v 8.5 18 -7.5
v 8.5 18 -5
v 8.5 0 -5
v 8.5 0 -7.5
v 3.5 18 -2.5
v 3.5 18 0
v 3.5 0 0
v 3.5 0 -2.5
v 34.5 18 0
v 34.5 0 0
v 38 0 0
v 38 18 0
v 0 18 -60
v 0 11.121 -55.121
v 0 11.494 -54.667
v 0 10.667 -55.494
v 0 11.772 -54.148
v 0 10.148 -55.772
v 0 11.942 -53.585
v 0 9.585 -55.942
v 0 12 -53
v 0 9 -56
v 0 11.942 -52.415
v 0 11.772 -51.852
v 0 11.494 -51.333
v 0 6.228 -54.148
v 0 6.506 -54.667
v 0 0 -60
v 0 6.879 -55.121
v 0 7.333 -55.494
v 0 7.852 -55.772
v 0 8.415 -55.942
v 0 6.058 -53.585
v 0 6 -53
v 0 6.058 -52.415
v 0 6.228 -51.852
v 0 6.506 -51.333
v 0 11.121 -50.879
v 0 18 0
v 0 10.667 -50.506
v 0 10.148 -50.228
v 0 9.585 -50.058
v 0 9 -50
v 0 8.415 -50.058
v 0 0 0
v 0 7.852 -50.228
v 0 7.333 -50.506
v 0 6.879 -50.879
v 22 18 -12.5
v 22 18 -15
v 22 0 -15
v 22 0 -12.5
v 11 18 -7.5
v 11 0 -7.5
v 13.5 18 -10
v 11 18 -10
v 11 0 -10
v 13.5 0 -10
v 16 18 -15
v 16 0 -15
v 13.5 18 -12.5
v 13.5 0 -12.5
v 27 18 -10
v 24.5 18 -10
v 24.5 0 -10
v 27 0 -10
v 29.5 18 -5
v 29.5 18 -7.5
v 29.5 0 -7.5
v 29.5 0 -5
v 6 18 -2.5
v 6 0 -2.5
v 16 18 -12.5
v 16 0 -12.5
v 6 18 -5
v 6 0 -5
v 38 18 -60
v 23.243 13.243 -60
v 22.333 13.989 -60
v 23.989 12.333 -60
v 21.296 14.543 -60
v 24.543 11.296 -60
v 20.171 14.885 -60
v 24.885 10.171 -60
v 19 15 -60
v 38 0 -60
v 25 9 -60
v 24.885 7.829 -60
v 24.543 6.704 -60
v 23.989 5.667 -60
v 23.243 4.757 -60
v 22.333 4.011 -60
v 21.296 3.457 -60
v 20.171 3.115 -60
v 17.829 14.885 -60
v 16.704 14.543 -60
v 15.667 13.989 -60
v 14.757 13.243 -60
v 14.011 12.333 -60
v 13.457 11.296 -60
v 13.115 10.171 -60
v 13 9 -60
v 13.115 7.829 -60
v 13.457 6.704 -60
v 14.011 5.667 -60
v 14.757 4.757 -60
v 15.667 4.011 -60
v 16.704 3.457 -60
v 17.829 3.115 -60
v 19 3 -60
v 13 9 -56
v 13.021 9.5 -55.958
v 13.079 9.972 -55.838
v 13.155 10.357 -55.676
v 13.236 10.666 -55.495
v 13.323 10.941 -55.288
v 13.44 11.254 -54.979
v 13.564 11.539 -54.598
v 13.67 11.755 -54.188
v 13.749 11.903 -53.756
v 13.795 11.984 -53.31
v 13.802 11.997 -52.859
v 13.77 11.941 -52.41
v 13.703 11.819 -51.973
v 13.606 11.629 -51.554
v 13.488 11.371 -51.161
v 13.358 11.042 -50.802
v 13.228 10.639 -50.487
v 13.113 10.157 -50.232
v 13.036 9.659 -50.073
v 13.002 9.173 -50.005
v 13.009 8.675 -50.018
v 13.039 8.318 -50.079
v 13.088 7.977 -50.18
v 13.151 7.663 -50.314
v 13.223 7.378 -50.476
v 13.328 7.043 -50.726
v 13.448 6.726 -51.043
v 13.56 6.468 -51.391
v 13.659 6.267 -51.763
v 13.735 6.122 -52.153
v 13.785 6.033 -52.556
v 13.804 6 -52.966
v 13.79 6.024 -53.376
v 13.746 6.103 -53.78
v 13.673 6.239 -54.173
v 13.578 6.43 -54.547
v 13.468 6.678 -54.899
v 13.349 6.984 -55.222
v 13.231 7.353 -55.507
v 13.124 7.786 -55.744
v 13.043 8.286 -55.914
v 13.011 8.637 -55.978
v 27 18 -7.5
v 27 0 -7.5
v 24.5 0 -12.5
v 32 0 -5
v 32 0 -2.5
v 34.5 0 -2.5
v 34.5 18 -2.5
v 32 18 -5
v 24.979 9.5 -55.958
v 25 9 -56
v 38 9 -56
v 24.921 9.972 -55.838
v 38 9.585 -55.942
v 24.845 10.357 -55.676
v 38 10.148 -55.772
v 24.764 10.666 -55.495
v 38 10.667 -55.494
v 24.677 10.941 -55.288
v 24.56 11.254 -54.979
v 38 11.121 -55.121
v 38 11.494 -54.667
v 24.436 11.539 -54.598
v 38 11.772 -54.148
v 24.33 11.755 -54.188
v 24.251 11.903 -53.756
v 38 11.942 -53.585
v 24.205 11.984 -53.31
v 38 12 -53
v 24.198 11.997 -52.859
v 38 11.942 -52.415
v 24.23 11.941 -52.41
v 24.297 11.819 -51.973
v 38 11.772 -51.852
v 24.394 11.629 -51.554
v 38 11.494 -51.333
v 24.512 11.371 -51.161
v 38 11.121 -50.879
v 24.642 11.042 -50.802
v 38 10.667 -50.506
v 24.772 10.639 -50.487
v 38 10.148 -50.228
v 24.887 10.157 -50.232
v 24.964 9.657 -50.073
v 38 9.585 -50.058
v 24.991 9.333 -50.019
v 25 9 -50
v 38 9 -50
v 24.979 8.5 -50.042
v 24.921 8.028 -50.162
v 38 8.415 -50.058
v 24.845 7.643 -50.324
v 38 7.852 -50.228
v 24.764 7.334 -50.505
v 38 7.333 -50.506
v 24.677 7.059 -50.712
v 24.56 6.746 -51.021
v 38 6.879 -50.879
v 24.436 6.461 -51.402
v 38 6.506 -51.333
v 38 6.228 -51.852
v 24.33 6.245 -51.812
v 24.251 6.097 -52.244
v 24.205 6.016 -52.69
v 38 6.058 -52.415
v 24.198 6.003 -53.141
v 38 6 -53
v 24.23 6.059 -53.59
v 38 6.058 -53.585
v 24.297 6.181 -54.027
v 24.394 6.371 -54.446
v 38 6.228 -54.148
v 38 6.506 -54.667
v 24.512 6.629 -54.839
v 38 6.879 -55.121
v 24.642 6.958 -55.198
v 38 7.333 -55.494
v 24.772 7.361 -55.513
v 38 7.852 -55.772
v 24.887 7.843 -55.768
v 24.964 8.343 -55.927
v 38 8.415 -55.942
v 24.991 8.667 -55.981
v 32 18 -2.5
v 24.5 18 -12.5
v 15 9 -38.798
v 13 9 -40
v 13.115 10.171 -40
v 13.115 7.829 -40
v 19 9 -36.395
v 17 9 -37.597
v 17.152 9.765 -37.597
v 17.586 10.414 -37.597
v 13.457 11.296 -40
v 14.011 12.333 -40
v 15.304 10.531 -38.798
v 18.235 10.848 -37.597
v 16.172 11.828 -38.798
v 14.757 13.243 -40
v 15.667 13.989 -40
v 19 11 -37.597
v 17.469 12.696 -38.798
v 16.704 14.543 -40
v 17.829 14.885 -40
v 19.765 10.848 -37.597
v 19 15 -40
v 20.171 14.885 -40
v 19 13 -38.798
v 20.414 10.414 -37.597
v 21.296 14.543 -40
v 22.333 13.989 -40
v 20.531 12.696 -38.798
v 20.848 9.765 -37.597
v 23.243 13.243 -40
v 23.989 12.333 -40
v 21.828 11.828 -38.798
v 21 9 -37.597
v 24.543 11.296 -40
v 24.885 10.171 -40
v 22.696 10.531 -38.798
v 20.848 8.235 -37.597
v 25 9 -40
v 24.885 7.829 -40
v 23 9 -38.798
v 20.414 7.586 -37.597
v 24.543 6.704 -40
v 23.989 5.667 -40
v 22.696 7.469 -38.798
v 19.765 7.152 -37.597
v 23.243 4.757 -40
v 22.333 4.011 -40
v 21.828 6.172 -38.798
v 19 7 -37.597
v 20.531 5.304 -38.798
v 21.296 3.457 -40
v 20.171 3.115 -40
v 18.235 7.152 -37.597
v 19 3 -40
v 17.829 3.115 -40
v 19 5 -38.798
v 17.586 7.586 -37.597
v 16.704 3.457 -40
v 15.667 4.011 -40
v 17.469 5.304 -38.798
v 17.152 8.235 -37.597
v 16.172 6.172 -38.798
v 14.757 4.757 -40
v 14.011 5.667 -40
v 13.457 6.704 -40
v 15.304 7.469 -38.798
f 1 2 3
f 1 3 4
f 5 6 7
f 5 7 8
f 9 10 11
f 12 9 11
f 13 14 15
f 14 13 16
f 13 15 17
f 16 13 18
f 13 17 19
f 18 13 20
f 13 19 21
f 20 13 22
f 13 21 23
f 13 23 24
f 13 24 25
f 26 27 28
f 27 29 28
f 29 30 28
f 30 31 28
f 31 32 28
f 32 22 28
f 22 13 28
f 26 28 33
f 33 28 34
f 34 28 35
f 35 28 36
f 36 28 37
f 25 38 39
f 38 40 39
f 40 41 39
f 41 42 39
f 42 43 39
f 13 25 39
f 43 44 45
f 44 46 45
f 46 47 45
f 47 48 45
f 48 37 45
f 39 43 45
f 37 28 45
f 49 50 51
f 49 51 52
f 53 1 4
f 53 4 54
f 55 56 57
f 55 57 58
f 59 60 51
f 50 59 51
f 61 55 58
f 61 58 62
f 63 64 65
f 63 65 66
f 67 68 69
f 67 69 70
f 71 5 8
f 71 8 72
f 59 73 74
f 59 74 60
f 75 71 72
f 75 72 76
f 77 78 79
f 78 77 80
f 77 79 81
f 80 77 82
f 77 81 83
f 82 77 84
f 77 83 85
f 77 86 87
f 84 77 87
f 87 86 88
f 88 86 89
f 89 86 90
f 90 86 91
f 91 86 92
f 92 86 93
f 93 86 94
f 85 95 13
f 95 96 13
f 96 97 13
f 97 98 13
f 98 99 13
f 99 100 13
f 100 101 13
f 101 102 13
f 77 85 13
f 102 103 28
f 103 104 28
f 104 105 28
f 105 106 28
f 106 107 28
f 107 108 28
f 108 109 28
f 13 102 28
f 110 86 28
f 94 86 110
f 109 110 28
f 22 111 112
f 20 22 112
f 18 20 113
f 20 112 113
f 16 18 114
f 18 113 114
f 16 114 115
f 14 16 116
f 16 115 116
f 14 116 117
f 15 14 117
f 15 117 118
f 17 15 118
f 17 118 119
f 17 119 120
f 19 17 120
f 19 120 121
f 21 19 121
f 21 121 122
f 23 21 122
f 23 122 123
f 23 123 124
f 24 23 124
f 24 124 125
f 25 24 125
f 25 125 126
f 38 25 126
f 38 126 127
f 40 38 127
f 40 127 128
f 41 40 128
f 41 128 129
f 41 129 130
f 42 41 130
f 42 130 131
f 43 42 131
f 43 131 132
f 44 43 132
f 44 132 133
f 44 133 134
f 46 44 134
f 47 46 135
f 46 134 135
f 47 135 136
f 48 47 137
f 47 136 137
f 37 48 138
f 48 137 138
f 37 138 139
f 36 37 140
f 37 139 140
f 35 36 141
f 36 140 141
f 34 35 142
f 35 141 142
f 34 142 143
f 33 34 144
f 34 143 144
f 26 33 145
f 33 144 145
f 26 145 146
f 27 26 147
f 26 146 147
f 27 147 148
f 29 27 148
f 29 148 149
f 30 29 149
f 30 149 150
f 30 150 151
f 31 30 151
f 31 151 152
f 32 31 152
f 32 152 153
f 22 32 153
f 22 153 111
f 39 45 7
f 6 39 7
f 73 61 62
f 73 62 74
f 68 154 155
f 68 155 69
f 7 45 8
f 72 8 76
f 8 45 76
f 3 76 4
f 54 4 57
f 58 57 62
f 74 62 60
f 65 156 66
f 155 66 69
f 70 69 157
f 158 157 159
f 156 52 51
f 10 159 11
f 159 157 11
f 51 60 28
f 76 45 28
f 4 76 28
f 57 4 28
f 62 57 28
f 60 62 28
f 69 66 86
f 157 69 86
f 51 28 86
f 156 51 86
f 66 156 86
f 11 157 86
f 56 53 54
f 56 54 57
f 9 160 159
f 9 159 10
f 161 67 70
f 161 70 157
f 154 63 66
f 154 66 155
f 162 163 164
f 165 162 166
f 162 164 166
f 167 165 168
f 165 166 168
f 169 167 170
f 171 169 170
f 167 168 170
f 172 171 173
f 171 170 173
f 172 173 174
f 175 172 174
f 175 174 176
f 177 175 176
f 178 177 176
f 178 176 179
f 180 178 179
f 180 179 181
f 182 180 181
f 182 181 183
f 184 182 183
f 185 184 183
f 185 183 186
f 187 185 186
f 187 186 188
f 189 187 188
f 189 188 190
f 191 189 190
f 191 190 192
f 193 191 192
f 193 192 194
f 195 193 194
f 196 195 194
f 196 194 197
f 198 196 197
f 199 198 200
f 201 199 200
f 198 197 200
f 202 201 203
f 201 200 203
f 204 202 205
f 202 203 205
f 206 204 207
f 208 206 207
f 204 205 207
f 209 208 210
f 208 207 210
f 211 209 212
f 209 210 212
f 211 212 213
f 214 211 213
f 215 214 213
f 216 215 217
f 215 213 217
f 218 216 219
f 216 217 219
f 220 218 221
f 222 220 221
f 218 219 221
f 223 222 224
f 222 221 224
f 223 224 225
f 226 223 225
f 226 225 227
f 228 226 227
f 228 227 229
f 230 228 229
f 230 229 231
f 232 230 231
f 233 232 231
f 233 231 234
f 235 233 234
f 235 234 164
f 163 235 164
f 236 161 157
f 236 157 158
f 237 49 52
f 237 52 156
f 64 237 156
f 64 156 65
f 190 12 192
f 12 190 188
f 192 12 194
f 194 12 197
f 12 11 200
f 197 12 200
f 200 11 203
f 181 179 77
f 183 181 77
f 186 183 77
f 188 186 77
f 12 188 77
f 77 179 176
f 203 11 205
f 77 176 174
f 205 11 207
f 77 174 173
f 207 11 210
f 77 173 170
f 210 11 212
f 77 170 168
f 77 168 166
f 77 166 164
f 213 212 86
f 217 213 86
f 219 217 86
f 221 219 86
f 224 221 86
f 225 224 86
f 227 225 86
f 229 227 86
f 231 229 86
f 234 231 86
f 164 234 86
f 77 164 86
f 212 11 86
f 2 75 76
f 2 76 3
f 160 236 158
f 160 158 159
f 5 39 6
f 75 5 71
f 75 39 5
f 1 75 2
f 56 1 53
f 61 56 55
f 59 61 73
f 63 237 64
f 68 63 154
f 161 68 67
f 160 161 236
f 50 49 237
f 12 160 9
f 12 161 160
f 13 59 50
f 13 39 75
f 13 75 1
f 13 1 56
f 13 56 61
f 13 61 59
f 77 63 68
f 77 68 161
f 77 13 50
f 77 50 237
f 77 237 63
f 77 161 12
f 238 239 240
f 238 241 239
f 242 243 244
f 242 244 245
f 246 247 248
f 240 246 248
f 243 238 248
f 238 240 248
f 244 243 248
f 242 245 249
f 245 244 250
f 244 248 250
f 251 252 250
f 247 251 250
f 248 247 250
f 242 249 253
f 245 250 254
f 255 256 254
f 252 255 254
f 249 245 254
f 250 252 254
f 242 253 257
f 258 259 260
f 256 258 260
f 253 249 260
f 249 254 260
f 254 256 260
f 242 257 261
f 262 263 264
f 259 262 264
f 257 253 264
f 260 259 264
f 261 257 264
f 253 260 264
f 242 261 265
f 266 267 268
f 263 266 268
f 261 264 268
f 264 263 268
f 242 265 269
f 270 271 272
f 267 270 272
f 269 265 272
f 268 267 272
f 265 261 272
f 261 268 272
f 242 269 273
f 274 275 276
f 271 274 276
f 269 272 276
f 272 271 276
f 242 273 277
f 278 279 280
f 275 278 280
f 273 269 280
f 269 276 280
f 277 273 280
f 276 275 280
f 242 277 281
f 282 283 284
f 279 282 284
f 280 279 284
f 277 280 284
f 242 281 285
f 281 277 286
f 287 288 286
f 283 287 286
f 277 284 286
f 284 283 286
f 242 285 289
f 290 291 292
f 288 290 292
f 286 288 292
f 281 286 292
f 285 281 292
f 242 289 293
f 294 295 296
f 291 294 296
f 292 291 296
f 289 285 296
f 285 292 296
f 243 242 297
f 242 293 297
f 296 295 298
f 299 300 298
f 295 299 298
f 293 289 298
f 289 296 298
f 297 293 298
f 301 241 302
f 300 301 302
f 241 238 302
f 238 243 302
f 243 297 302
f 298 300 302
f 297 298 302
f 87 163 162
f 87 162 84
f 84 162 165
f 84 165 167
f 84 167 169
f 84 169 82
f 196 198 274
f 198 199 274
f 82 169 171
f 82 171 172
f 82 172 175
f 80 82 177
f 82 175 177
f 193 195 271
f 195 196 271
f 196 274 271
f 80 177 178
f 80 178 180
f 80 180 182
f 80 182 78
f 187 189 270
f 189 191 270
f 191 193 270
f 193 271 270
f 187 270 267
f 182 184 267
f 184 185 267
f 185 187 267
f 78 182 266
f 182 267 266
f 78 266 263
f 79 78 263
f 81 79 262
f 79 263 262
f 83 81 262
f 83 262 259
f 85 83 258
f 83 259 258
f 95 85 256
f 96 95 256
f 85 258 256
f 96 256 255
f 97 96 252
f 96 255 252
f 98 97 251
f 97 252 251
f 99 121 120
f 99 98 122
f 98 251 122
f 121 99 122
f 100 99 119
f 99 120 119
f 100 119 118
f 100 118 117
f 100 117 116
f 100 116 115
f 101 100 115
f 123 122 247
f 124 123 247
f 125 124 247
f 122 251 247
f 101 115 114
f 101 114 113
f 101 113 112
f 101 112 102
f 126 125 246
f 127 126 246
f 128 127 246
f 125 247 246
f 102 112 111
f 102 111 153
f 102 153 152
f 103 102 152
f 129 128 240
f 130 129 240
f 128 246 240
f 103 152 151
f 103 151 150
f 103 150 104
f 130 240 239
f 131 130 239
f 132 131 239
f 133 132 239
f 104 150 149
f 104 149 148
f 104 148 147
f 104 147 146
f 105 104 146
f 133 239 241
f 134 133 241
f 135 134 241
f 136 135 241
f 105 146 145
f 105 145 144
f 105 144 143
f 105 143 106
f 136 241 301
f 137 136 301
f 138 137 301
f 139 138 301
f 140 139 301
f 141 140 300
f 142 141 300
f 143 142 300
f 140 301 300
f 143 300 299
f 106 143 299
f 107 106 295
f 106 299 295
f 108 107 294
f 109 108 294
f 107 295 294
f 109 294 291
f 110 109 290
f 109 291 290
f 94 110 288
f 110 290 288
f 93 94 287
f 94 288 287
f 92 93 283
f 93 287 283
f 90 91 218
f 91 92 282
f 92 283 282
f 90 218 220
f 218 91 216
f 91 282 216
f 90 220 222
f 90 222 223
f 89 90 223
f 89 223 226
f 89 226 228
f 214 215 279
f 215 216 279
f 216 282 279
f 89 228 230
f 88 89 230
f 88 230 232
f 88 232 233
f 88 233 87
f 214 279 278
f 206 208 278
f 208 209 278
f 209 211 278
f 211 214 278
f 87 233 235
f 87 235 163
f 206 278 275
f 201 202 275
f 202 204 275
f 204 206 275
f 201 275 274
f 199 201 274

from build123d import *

# Parameters (mm, degrees)
BOSS_EXTRUDE1_DEPTH        = 18
SKETCH2_R                  = 3
CUT_EXTRUDE1_DEPTH         = 38
F_12_0MM_DOWEL_HOLE1_D     = 12
F_12_0MM_DOWEL_HOLE1_DEPTH = 20
F_12_0MM_DOWEL_HOLE1_TIP   = 3.605163714


with BuildPart() as part:
    # Sketch1 → Boss-Extrude1 (new body)
    with BuildSketch(Plane(origin=(0, 0, 0), x_dir=(1, 0, 0), z_dir=(0, 1, 0))):
        Polygon((0, 60), (0, 0), (3.5, 0), (3.5, 2.5), (6, 2.5), (6, 5), (8.5, 5), (8.5, 7.5), (11, 7.5), (11, 10), (13.5, 10), (13.5, 12.5), (16, 12.5), (16, 15), (22, 15), (22, 12.5), (24.5, 12.5), (24.5, 10), (27, 10), (27, 7.5), (29.5, 7.5), (29.5, 5), (32, 5), (32, 2.5), (34.5, 2.5), (34.5, 0), (38, 0), (38, 60), align=None)
    extrude(amount=BOSS_EXTRUDE1_DEPTH)

    # Sketch2 → Cut-Extrude1 (cut)
    with BuildSketch(Plane(origin=(38, 0, 0), x_dir=(0, 0, -1), z_dir=(1, 0, 0))):
        with Locations((53, 9)):
            Circle(SKETCH2_R)
    extrude(amount=-CUT_EXTRUDE1_DEPTH, mode=Mode.SUBTRACT)

    # Ø12.0mm Dowel Hole1
    with Locations(Plane(origin=(19, 9, -60), x_dir=(-1, 0, 0), z_dir=(0, 0, -1))):
        with Locations((0, 0)):
            Hole(F_12_0MM_DOWEL_HOLE1_D / 2, depth=F_12_0MM_DOWEL_HOLE1_DEPTH)
            with Locations((0, 0, -(F_12_0MM_DOWEL_HOLE1_DEPTH + F_12_0MM_DOWEL_HOLE1_TIP / 2))):  # 118° drill point
                Cone(0, F_12_0MM_DOWEL_HOLE1_D / 2, F_12_0MM_DOWEL_HOLE1_TIP, mode=Mode.SUBTRACT)


solid = part.part
